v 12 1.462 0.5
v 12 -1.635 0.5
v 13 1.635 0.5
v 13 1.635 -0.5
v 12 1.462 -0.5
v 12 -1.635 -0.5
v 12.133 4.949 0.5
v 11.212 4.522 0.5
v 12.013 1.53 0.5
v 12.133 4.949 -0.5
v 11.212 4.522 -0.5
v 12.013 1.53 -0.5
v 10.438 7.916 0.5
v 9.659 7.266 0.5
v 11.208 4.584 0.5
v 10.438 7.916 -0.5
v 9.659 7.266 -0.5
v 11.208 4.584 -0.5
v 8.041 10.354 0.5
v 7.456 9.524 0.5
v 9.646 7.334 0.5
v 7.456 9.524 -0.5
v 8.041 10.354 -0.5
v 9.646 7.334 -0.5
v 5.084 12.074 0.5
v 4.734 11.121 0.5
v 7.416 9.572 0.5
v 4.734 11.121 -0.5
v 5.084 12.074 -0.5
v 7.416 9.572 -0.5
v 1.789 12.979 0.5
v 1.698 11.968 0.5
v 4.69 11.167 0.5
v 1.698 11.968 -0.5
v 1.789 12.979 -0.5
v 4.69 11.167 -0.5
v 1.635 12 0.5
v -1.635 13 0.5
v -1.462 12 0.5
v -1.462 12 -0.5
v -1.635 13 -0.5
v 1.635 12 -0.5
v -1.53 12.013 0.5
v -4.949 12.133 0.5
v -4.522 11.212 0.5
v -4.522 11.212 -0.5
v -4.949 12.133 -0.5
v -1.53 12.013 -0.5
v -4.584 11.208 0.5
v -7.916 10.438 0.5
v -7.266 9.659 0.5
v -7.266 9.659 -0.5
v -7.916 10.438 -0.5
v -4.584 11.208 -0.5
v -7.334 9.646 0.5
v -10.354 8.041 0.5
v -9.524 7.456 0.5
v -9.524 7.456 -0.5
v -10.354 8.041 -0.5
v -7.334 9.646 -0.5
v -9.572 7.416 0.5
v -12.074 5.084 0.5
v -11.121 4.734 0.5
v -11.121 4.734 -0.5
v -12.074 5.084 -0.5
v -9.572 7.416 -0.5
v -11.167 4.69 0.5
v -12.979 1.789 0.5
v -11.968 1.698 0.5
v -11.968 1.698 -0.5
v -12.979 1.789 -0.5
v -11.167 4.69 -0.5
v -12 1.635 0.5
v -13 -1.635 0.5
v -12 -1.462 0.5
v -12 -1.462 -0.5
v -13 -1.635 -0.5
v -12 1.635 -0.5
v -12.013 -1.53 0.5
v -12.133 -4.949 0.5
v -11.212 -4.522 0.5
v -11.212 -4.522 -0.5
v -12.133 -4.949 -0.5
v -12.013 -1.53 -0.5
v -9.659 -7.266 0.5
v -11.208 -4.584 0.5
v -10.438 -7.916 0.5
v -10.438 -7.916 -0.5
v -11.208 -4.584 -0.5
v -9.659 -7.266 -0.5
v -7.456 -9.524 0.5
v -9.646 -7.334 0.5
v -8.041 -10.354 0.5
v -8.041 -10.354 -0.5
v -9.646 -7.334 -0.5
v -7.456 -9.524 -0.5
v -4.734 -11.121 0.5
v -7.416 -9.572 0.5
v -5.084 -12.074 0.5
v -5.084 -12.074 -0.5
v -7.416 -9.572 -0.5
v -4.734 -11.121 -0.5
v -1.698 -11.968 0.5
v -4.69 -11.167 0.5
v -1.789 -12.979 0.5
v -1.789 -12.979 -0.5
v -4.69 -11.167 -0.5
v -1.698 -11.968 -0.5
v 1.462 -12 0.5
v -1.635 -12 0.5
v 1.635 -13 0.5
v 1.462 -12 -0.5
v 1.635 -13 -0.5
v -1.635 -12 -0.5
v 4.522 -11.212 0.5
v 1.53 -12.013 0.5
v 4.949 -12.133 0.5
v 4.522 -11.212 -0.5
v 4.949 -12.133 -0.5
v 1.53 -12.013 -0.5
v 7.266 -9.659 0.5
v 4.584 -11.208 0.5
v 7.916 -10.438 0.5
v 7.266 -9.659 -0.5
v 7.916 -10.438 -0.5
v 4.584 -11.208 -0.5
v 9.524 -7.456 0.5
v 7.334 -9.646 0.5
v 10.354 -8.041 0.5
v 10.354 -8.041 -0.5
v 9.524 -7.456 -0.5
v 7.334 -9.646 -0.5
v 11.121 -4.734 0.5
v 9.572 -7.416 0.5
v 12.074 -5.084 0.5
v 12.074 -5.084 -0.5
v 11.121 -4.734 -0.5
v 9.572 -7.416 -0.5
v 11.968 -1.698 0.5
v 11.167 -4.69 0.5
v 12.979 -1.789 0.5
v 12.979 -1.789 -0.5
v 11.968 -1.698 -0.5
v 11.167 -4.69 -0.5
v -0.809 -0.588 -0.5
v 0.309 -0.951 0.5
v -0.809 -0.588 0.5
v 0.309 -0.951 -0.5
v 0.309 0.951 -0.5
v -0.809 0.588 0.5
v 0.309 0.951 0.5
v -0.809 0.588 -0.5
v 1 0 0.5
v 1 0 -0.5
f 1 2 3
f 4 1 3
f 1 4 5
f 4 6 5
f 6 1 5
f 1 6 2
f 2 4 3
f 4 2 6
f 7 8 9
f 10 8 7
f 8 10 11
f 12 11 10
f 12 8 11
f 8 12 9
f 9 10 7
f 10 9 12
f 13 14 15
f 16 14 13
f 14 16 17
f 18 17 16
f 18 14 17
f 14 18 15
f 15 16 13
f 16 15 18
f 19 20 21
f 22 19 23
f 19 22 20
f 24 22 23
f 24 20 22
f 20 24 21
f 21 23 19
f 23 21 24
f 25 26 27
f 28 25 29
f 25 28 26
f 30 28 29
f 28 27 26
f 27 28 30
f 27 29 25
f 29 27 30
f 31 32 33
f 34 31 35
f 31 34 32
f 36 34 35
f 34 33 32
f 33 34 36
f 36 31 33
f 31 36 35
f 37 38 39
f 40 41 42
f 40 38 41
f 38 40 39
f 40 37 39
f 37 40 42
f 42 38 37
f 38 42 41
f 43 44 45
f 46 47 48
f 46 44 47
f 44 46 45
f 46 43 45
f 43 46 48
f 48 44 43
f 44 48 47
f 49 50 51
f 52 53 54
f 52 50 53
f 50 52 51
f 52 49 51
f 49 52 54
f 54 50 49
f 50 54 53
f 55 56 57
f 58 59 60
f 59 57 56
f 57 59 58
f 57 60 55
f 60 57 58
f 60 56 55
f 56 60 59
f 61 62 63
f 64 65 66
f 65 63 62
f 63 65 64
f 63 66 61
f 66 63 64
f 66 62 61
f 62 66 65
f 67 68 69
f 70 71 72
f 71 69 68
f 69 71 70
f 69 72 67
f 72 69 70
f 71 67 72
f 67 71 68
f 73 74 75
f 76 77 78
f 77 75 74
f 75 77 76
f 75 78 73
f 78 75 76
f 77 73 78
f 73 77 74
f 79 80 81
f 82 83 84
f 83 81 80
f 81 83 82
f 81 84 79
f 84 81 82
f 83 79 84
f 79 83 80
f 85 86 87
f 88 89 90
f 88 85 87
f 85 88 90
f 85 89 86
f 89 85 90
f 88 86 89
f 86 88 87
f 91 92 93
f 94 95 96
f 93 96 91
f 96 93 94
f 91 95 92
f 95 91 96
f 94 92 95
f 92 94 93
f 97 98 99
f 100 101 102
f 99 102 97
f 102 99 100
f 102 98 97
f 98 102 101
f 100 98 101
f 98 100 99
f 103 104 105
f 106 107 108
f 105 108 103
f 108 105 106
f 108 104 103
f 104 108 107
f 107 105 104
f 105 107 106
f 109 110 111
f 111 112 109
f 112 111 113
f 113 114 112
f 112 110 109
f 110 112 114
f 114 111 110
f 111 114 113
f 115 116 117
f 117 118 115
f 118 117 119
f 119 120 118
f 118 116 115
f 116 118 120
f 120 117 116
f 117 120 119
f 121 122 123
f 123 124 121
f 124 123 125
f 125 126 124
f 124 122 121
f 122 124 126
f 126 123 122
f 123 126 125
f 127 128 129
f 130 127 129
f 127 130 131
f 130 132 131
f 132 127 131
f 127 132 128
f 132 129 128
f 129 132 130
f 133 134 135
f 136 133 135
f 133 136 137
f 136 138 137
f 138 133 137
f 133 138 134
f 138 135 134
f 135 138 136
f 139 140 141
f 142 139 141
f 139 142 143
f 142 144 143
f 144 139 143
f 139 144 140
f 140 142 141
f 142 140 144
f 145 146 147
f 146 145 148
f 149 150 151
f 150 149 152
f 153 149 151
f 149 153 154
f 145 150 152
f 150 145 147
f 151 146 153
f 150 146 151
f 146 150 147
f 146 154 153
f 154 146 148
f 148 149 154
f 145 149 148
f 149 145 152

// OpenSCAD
// file: Rachet Tooth.scad
module rachetTooth(ht = 1, thk=1,ra = 20, ba = 60){
//	ra = ramp angle
//	ba = back angle
//	ht = height
	
	xh = ht/tan(ra);
	xb = xh - ht*sin(90-ba);
	//echo(xh);
	rotate([0,0,90])
	translate([0,thk/2,0])
	rotate([90,0,0])
	translate([-xh/2,0,0])
	linear_extrude(height = 1) polygon(points=[[0,0],[xh,ht],[xb,0]]);
}
rachetTooth();
// main file
use<Rachet Tooth.scad>;


color("green", 1.0) union() {
    translate([12.00,0.00,0.00]) rotate([0, 0, 0]) rotate([0, 90, 0])     rachetTooth(thk = 1, 
        ba = 80, 
        ht = 1, 
        ra = 17);
    translate([11.59,3.11,0.00]) rotate([0, 0, 15]) rotate([0, 90, 0])     rachetTooth(thk = 1, 
        ba = 80, 
        ht = 1, 
        ra = 17);
    translate([10.39,6.00,0.00]) rotate([0, 0, 30]) rotate([0, 90, 0])     rachetTooth(thk = 1, 
        ba = 80, 
        ht = 1, 
        ra = 17);
    translate([8.49,8.49,0.00]) rotate([0, 0, 45]) rotate([0, 90, 0])     rachetTooth(thk = 1, 
        ba = 80, 
        ht = 1, 
        ra = 17);
    translate([6.00,10.39,0.00]) rotate([0, 0, 60]) rotate([0, 90, 0])     rachetTooth(thk = 1, 
        ba = 80, 
        ht = 1, 
        ra = 17);
    translate([3.11,11.59,0.00]) rotate([0, 0, 75]) rotate([0, 90, 0])     rachetTooth(thk = 1, 
        ba = 80, 
        ht = 1, 
        ra = 17);
    translate([0.00,12.00,0.00]) rotate([0, 0, 90]) rotate([0, 90, 0])     rachetTooth(thk = 1, 
        ba = 80, 
        ht = 1, 
        ra = 17);
    translate([-3.11,11.59,0.00]) rotate([0, 0, 105]) rotate([0, 90, 0])     rachetTooth(thk = 1, 
        ba = 80, 
        ht = 1, 
        ra = 17);
    translate([-6.00,10.39,0.00]) rotate([0, 0, 120]) rotate([0, 90, 0])     rachetTooth(thk = 1, 
        ba = 80, 
        ht = 1, 
        ra = 17);
    translate([-8.49,8.49,0.00]) rotate([0, 0, 135]) rotate([0, 90, 0])     rachetTooth(thk = 1, 
        ba = 80, 
        ht = 1, 
        ra = 17);
    translate([-10.39,6.00,0.00]) rotate([0, 0, 150]) rotate([0, 90, 0])     rachetTooth(thk = 1, 
        ba = 80, 
        ht = 1, 
        ra = 17);
    translate([-11.59,3.11,0.00]) rotate([0, 0, 165]) rotate([0, 90, 0])     rachetTooth(thk = 1, 
        ba = 80, 
        ht = 1, 
        ra = 17);
    translate([-12.00,0.00,0.00]) rotate([0, 0, 180]) rotate([0, 90, 0])     rachetTooth(thk = 1, 
        ba = 80, 
        ht = 1, 
        ra = 17);
    translate([-11.59,-3.11,0.00]) rotate([0, 0, 195]) rotate([0, 90, 0])     rachetTooth(thk = 1, 
        ba = 80, 
        ht = 1, 
        ra = 17);
    translate([-10.39,-6.00,0.00]) rotate([0, 0, 210]) rotate([0, 90, 0])     rachetTooth(thk = 1, 
        ba = 80, 
        ht = 1, 
        ra = 17);
    translate([-8.49,-8.49,0.00]) rotate([0, 0, 225]) rotate([0, 90, 0])     rachetTooth(thk = 1, 
        ba = 80, 
        ht = 1, 
        ra = 17);
    translate([-6.00,-10.39,0.00]) rotate([0, 0, 240]) rotate([0, 90, 0])     rachetTooth(thk = 1, 
        ba = 80, 
        ht = 1, 
        ra = 17);
    translate([-3.11,-11.59,0.00]) rotate([0, 0, 255]) rotate([0, 90, 0])     rachetTooth(thk = 1, 
        ba = 80, 
        ht = 1, 
        ra = 17);
    translate([-0.00,-12.00,0.00]) rotate([0, 0, 270]) rotate([0, 90, 0])     rachetTooth(thk = 1, 
        ba = 80, 
        ht = 1, 
        ra = 17);
    translate([3.11,-11.59,0.00]) rotate([0, 0, 285]) rotate([0, 90, 0])     rachetTooth(thk = 1, 
        ba = 80, 
        ht = 1, 
        ra = 17);
    translate([6.00,-10.39,0.00]) rotate([0, 0, 300]) rotate([0, 90, 0])     rachetTooth(thk = 1, 
        ba = 80, 
        ht = 1, 
        ra = 17);
    translate([8.49,-8.49,0.00]) rotate([0, 0, 315]) rotate([0, 90, 0])     rachetTooth(thk = 1, 
        ba = 80, 
        ht = 1, 
        ra = 17);
    translate([10.39,-6.00,0.00]) rotate([0, 0, 330]) rotate([0, 90, 0])     rachetTooth(thk = 1, 
        ba = 80, 
        ht = 1, 
        ra = 17);
    translate([11.59,-3.11,0.00]) rotate([0, 0, 345]) rotate([0, 90, 0])     rachetTooth(thk = 1, 
        ba = 80, 
        ht = 1, 
        ra = 17);
    cylinder(h=1, r=1, center = true);
}
